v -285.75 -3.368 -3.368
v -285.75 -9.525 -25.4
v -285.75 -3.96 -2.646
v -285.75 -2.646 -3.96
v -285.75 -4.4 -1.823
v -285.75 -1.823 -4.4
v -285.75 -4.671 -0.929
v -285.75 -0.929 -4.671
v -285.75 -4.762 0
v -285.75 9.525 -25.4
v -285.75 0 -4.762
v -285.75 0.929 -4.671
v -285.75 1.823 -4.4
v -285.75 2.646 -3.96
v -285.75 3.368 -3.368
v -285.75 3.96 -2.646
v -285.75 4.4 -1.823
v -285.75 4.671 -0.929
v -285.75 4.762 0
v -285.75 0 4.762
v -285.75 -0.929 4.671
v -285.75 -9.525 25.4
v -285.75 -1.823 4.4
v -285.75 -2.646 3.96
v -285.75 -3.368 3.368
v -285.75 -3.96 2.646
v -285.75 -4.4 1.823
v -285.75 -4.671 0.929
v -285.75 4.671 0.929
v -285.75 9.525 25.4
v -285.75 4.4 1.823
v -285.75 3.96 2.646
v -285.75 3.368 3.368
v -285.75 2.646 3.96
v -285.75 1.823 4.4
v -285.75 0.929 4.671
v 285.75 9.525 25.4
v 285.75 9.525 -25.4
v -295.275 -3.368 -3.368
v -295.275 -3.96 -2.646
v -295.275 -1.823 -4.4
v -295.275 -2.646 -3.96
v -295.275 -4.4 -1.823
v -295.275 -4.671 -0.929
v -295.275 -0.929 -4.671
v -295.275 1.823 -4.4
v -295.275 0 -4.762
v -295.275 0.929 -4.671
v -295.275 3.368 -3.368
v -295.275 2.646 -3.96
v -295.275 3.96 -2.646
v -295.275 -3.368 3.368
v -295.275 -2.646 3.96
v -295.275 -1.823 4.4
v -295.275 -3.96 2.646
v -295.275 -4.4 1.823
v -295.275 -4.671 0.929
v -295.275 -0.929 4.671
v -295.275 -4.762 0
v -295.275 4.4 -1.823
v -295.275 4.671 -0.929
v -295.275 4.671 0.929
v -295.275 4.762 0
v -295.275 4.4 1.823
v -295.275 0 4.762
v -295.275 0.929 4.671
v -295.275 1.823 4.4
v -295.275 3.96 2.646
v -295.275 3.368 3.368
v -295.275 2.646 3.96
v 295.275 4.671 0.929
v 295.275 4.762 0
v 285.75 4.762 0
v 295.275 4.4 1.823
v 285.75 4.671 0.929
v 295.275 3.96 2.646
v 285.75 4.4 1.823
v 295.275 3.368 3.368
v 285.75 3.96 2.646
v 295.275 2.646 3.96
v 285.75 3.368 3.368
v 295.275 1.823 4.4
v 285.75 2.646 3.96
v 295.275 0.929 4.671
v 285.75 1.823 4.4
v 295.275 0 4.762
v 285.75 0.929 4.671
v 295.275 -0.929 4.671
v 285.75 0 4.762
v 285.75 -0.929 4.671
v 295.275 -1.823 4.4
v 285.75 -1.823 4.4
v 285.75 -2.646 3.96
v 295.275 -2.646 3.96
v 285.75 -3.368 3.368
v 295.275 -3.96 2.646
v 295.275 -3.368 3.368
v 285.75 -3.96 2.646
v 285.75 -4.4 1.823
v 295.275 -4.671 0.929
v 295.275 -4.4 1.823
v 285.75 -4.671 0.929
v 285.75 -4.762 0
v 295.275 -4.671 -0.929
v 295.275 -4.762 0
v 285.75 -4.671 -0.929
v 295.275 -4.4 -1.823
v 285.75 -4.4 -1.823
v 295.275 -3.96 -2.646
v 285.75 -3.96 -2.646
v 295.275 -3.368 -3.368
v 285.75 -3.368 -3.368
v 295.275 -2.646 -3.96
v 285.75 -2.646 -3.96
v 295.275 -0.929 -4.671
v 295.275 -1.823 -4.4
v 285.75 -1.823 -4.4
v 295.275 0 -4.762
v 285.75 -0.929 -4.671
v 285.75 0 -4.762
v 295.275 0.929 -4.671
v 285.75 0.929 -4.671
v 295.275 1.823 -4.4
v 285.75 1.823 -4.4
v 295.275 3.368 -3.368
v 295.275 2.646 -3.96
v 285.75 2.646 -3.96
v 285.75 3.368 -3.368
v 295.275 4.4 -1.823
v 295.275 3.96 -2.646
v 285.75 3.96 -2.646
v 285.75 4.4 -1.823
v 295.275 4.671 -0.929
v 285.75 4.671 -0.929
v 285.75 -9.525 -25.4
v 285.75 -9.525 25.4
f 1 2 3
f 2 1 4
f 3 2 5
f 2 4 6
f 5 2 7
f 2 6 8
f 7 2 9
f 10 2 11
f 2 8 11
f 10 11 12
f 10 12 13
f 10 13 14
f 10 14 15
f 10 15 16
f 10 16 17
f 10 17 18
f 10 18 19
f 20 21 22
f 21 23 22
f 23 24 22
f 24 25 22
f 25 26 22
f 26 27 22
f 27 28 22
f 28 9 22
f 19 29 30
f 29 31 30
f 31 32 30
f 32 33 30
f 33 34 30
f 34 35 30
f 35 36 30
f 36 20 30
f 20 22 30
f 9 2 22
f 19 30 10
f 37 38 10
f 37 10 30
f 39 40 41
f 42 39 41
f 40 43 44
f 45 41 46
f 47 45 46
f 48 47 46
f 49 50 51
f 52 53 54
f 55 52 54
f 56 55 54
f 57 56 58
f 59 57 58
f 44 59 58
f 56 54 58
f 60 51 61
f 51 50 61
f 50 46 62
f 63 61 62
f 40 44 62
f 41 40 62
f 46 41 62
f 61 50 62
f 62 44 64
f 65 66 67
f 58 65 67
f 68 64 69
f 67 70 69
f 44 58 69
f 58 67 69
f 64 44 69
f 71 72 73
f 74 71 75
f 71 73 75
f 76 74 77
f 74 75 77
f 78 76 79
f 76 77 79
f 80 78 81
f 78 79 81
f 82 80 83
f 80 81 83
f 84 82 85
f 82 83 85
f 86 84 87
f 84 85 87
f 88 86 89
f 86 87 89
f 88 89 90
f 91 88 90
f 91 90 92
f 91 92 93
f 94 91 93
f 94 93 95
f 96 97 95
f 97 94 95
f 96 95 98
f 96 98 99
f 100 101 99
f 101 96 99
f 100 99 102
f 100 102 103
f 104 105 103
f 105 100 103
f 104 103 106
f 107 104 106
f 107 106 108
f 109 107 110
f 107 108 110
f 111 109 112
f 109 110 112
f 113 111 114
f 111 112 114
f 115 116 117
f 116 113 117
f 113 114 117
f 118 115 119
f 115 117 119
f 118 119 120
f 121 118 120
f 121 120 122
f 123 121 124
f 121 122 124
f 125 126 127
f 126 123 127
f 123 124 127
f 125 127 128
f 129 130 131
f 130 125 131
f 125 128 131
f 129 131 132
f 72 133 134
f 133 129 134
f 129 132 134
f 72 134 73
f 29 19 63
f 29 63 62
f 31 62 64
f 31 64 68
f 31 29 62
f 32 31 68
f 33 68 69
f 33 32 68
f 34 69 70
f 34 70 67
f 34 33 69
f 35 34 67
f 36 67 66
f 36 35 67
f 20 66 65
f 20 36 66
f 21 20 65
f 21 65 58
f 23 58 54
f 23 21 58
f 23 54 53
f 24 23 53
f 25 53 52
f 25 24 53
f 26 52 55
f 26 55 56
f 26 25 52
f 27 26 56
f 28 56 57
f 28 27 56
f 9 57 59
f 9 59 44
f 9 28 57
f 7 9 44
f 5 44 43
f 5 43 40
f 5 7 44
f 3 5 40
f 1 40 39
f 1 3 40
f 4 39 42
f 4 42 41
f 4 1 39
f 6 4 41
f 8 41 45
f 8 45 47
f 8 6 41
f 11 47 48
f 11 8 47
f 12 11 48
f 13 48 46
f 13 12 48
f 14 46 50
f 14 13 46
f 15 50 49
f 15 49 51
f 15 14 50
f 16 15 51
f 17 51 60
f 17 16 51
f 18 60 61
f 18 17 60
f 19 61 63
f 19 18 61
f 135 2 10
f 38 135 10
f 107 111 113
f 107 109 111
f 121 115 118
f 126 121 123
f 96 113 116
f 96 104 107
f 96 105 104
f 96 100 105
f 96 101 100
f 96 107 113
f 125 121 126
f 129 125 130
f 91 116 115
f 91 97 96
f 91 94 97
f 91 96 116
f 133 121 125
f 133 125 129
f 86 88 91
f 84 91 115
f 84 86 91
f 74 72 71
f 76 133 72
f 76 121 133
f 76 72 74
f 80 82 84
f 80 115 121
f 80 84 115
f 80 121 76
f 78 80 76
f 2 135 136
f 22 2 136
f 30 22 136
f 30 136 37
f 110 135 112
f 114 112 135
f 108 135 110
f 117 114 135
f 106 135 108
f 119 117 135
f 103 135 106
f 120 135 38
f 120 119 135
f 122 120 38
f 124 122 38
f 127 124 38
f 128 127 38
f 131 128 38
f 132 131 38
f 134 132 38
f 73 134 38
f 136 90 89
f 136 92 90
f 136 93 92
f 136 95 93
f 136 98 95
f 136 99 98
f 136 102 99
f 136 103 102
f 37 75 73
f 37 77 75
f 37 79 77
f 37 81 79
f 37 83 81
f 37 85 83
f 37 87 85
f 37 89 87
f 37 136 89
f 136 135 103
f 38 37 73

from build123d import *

# Parameters (mm, degrees)
F0_W     = 19.05
F0_H     = 50.8
F1_DEPTH = 295.275
F3_W     = 73.66158
F3_H     = 70.153892
F3_R     = 4.7625
F4_DEPTH = 9.526
F6_W     = 59.882906
F6_H     = 61.81458
F6_R     = 4.7625
F7_DEPTH = 9.525


with BuildPart() as f1:
    # F0 (on Right) → F1 (new body, symmetric)
    with BuildSketch(Plane.YZ):
        Rectangle(F0_W, F0_H)
    extrude(amount=F1_DEPTH, both=True)

    # F3 (on offset) → F4 (cut, through all)
    with BuildSketch(Plane.YZ.offset(285.75)):
        Rectangle(F3_W, F3_H)
        Circle(F3_R, mode=Mode.SUBTRACT)
    extrude(amount=F4_DEPTH, mode=Mode.SUBTRACT)

    # F6 (on offset) → F7 (cut)
    with BuildSketch(Plane.YZ.offset(-285.75)):
        Rectangle(F6_W, F6_H)
        Circle(F6_R, mode=Mode.SUBTRACT)
    extrude(amount=-F7_DEPTH, mode=Mode.SUBTRACT)


solid = f1.part
